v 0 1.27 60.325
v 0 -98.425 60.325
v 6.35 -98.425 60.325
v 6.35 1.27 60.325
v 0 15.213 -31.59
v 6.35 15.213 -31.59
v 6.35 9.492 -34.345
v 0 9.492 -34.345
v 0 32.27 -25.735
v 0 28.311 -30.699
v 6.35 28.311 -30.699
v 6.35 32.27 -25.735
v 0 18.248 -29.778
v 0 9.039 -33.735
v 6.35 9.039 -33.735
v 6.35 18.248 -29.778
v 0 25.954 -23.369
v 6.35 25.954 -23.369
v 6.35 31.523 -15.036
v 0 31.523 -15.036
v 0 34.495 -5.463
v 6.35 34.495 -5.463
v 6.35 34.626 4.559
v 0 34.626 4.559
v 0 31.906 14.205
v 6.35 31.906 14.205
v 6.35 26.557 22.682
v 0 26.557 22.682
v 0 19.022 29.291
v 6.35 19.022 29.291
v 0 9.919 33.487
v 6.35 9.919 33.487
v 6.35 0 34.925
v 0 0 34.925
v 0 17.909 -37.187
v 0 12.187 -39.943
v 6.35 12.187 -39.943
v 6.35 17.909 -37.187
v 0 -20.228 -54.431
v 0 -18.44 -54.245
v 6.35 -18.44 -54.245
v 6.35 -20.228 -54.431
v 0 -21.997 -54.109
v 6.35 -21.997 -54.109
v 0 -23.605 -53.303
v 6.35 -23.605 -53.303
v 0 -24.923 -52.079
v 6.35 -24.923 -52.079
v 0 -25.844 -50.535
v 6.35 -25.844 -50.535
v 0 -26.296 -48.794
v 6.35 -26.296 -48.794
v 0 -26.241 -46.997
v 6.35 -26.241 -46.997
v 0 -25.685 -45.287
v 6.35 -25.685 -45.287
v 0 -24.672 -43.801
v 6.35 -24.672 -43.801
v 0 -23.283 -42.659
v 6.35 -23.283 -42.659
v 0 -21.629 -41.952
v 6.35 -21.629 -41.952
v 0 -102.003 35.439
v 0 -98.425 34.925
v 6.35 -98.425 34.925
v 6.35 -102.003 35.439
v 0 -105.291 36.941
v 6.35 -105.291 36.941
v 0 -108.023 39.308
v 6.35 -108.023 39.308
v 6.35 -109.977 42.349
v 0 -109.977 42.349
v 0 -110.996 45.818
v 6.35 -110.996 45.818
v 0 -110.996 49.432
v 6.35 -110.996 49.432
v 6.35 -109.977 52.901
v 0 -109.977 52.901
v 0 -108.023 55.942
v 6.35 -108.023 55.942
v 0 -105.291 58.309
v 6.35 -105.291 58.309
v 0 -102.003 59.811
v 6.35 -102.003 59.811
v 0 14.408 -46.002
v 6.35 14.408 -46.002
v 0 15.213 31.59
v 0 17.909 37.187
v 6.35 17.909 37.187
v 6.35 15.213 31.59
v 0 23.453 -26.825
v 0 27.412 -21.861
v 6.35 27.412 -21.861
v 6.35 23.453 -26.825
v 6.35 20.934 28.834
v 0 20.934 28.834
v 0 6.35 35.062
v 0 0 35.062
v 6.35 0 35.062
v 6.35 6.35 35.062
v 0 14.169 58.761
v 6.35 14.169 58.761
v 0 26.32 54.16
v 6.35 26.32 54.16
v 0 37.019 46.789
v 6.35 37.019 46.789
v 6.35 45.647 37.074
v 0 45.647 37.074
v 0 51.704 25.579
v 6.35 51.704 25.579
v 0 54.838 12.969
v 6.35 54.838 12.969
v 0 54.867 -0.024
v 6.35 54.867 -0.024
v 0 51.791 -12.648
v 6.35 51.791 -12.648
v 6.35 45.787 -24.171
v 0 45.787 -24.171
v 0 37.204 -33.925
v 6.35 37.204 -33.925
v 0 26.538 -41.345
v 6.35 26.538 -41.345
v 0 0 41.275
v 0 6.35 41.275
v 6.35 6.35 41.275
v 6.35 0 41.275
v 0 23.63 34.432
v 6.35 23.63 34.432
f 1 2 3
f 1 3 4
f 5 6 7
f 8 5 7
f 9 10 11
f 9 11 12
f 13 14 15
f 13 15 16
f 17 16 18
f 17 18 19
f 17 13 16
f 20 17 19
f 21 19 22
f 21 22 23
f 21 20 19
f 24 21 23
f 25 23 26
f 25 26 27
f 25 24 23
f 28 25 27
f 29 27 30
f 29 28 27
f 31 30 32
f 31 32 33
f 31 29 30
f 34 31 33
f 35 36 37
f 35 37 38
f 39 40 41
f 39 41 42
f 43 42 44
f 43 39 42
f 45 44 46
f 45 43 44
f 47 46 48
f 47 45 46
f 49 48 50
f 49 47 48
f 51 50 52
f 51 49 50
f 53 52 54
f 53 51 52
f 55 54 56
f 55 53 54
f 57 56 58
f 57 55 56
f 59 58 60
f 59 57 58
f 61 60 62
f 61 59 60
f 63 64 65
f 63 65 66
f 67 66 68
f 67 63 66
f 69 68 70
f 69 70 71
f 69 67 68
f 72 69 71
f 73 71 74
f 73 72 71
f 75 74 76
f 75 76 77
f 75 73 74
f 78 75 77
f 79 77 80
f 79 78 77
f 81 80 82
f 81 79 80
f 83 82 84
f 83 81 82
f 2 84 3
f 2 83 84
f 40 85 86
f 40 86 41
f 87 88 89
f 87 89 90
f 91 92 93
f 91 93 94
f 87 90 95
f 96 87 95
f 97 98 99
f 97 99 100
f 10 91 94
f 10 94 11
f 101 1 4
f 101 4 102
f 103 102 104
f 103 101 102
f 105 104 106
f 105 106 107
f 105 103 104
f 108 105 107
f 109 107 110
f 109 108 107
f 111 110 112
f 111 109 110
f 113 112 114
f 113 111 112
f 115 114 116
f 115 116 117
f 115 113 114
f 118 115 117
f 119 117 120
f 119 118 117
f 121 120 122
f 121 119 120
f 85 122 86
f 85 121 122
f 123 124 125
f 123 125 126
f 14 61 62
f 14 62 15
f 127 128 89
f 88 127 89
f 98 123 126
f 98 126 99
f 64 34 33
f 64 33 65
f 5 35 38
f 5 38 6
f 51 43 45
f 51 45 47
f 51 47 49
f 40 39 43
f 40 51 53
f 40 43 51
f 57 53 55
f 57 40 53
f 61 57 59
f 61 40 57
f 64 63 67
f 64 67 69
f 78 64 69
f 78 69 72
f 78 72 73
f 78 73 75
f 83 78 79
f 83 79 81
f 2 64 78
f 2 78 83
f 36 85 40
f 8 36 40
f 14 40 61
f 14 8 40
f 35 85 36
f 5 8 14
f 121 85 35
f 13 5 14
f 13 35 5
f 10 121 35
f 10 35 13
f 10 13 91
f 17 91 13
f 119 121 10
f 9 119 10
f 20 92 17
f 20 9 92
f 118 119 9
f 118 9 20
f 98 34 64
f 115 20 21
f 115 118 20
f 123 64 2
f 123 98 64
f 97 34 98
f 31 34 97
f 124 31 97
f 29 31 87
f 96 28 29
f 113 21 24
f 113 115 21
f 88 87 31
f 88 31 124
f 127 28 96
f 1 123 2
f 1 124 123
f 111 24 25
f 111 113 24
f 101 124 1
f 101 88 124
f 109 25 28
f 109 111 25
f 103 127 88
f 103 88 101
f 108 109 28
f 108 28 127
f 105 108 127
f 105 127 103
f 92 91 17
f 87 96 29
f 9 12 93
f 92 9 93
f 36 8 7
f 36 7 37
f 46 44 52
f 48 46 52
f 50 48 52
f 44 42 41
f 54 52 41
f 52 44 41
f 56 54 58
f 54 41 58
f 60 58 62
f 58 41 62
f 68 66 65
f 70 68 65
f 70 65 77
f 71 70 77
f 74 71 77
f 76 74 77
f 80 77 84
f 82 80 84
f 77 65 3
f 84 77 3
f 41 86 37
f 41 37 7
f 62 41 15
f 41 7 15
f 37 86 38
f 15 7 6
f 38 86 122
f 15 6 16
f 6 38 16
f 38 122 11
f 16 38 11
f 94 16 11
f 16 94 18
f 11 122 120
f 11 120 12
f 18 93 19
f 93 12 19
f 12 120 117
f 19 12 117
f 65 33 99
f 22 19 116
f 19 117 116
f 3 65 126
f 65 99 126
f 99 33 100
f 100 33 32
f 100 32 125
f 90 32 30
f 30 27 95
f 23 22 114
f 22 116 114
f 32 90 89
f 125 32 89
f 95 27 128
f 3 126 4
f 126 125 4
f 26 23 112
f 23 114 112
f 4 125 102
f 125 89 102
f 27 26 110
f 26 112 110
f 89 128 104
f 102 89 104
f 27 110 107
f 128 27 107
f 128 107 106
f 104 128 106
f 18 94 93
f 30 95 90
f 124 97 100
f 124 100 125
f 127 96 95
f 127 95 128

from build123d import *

# Parameters (mm, degrees)
BOSS_EXTRUDE1_DEPTH = 6.35
CUT_EXTRUDE2_START  = -7.35
CUT_EXTRUDE2_DEPTH  = 8.35
CIRPATTERN2_COUNT   = 8
CIRPATTERN2_ANGLE   = 180


with BuildPart() as part:
    # Sketch1 → Boss-Extrude1 (new body)
    with BuildSketch(Plane(origin=(0, 0, 0), x_dir=(0, 0, -1), z_dir=(1, 0, 0))):
        with BuildLine():
            Line((-60.325, -98.425), (-60.325, 1.27))
            ThreePointArc((-60.325, 1.27), (-12.969041148, 54.83761073), (46.001592655, 14.408164693))
            Line((46.001592655, 14.408164693), (54.245104063, -18.439722464))
            ThreePointArc((54.245104063, -18.439722464), (49.680727349, -26.131903505), (41.952464165, -21.628889834))
            Line((41.952464165, -21.628889834), (33.734959483, 9.03925515))
            ThreePointArc((33.734959483, 9.03925515), (-4.558627263, 34.626211783), (-34.925, 0))
            Line((-34.925, 0), (-34.925, -98.425))
            ThreePointArc((-34.925, -98.425), (-47.625, -111.125), (-60.325, -98.425))
        make_face()
    extrude(amount=BOSS_EXTRUDE1_DEPTH)

    # Sketch5 → Cut-Extrude2 (cut)
    with BuildSketch(Plane(origin=(6.35, 0, 0), x_dir=(0, 0, -1), z_dir=(1, 0, 0)).offset(CUT_EXTRUDE2_START)):
        Polygon((-38.1, 6.35), (-41.275, 6.35), (-41.275, 0), (-35.06174314, 0), (-35.06174314, 6.35), align=None)
    cut_extrude2 = extrude(amount=CUT_EXTRUDE2_DEPTH, mode=Mode.SUBTRACT)

    # CirPattern2: Cut-Extrude2 ×8 about axis, 4 skipped
    cirpattern2_axis = Axis((0, 0, 0), (-1, 0, 0))
    add([cut_extrude2.rotate(cirpattern2_axis, i * CIRPATTERN2_ANGLE / (CIRPATTERN2_COUNT - 1)) for i in range(1, CIRPATTERN2_COUNT) if i not in (2, 3, 4, 7)], mode=Mode.SUBTRACT)


solid = part.part
